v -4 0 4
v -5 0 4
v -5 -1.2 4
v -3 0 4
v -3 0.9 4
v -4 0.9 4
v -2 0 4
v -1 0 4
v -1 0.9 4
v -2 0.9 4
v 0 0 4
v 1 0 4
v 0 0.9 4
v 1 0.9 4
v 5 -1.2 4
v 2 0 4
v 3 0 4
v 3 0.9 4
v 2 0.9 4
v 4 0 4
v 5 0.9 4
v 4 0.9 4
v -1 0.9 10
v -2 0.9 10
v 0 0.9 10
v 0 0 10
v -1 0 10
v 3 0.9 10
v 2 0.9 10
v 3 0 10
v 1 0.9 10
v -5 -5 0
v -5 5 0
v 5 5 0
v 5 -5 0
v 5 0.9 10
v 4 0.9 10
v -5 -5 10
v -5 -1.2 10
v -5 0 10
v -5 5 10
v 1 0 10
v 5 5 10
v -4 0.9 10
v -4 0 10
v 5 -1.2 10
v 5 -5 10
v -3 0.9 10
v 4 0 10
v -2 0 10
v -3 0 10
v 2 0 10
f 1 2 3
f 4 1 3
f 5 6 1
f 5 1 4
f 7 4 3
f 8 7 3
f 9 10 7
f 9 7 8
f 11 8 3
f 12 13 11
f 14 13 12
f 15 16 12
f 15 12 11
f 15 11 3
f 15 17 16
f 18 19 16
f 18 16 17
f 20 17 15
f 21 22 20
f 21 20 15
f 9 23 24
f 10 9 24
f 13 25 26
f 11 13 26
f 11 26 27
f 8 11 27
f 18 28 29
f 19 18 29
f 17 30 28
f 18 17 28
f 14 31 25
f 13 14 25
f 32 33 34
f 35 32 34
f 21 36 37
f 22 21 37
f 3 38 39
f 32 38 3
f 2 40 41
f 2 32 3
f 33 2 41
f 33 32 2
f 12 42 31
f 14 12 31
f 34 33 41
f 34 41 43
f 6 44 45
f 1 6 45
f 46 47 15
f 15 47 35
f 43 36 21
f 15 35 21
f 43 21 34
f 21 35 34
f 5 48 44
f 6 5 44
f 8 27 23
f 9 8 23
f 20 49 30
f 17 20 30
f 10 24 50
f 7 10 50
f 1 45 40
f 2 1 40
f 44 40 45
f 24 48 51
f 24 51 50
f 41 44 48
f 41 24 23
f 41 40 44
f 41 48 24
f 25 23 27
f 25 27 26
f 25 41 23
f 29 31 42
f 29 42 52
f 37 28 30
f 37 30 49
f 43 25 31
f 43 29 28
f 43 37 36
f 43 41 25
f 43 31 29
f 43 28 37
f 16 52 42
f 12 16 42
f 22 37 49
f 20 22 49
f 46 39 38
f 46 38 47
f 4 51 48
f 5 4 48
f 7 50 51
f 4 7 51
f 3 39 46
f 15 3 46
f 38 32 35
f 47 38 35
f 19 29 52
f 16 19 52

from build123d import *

# Parameters (mm, degrees)
F0_W     = 10
F0_H     = 10
F1_DEPTH = 10
F3_DEPTH = 6


with BuildPart() as f1:
    # F0 (on Top) → F1 (new body)
    with BuildSketch(Plane.XY):
        Rectangle(F0_W, F0_H)
    extrude(amount=F1_DEPTH)

    # F2 (on face) → F3 (cut)
    with BuildSketch(Plane.XY.offset(10)):
        Polygon((-4, 0), (-5, 0), (-5, -1.2), (5, -1.2), (5, 0), (5, 0.9), (4, 0.9), (4, 0), (3, 0), (3, 0.9), (2, 0.9), (2, 0), (1, 0), (1, 0.9), (0, 0.9), (0, 0), (-1, 0), (-1, 0.9), (-2, 0.9), (-2, 0), (-3, 0), (-3, 0.9), (-4, 0.9), align=None)
    extrude(amount=-F3_DEPTH, mode=Mode.SUBTRACT)


solid = f1.part
